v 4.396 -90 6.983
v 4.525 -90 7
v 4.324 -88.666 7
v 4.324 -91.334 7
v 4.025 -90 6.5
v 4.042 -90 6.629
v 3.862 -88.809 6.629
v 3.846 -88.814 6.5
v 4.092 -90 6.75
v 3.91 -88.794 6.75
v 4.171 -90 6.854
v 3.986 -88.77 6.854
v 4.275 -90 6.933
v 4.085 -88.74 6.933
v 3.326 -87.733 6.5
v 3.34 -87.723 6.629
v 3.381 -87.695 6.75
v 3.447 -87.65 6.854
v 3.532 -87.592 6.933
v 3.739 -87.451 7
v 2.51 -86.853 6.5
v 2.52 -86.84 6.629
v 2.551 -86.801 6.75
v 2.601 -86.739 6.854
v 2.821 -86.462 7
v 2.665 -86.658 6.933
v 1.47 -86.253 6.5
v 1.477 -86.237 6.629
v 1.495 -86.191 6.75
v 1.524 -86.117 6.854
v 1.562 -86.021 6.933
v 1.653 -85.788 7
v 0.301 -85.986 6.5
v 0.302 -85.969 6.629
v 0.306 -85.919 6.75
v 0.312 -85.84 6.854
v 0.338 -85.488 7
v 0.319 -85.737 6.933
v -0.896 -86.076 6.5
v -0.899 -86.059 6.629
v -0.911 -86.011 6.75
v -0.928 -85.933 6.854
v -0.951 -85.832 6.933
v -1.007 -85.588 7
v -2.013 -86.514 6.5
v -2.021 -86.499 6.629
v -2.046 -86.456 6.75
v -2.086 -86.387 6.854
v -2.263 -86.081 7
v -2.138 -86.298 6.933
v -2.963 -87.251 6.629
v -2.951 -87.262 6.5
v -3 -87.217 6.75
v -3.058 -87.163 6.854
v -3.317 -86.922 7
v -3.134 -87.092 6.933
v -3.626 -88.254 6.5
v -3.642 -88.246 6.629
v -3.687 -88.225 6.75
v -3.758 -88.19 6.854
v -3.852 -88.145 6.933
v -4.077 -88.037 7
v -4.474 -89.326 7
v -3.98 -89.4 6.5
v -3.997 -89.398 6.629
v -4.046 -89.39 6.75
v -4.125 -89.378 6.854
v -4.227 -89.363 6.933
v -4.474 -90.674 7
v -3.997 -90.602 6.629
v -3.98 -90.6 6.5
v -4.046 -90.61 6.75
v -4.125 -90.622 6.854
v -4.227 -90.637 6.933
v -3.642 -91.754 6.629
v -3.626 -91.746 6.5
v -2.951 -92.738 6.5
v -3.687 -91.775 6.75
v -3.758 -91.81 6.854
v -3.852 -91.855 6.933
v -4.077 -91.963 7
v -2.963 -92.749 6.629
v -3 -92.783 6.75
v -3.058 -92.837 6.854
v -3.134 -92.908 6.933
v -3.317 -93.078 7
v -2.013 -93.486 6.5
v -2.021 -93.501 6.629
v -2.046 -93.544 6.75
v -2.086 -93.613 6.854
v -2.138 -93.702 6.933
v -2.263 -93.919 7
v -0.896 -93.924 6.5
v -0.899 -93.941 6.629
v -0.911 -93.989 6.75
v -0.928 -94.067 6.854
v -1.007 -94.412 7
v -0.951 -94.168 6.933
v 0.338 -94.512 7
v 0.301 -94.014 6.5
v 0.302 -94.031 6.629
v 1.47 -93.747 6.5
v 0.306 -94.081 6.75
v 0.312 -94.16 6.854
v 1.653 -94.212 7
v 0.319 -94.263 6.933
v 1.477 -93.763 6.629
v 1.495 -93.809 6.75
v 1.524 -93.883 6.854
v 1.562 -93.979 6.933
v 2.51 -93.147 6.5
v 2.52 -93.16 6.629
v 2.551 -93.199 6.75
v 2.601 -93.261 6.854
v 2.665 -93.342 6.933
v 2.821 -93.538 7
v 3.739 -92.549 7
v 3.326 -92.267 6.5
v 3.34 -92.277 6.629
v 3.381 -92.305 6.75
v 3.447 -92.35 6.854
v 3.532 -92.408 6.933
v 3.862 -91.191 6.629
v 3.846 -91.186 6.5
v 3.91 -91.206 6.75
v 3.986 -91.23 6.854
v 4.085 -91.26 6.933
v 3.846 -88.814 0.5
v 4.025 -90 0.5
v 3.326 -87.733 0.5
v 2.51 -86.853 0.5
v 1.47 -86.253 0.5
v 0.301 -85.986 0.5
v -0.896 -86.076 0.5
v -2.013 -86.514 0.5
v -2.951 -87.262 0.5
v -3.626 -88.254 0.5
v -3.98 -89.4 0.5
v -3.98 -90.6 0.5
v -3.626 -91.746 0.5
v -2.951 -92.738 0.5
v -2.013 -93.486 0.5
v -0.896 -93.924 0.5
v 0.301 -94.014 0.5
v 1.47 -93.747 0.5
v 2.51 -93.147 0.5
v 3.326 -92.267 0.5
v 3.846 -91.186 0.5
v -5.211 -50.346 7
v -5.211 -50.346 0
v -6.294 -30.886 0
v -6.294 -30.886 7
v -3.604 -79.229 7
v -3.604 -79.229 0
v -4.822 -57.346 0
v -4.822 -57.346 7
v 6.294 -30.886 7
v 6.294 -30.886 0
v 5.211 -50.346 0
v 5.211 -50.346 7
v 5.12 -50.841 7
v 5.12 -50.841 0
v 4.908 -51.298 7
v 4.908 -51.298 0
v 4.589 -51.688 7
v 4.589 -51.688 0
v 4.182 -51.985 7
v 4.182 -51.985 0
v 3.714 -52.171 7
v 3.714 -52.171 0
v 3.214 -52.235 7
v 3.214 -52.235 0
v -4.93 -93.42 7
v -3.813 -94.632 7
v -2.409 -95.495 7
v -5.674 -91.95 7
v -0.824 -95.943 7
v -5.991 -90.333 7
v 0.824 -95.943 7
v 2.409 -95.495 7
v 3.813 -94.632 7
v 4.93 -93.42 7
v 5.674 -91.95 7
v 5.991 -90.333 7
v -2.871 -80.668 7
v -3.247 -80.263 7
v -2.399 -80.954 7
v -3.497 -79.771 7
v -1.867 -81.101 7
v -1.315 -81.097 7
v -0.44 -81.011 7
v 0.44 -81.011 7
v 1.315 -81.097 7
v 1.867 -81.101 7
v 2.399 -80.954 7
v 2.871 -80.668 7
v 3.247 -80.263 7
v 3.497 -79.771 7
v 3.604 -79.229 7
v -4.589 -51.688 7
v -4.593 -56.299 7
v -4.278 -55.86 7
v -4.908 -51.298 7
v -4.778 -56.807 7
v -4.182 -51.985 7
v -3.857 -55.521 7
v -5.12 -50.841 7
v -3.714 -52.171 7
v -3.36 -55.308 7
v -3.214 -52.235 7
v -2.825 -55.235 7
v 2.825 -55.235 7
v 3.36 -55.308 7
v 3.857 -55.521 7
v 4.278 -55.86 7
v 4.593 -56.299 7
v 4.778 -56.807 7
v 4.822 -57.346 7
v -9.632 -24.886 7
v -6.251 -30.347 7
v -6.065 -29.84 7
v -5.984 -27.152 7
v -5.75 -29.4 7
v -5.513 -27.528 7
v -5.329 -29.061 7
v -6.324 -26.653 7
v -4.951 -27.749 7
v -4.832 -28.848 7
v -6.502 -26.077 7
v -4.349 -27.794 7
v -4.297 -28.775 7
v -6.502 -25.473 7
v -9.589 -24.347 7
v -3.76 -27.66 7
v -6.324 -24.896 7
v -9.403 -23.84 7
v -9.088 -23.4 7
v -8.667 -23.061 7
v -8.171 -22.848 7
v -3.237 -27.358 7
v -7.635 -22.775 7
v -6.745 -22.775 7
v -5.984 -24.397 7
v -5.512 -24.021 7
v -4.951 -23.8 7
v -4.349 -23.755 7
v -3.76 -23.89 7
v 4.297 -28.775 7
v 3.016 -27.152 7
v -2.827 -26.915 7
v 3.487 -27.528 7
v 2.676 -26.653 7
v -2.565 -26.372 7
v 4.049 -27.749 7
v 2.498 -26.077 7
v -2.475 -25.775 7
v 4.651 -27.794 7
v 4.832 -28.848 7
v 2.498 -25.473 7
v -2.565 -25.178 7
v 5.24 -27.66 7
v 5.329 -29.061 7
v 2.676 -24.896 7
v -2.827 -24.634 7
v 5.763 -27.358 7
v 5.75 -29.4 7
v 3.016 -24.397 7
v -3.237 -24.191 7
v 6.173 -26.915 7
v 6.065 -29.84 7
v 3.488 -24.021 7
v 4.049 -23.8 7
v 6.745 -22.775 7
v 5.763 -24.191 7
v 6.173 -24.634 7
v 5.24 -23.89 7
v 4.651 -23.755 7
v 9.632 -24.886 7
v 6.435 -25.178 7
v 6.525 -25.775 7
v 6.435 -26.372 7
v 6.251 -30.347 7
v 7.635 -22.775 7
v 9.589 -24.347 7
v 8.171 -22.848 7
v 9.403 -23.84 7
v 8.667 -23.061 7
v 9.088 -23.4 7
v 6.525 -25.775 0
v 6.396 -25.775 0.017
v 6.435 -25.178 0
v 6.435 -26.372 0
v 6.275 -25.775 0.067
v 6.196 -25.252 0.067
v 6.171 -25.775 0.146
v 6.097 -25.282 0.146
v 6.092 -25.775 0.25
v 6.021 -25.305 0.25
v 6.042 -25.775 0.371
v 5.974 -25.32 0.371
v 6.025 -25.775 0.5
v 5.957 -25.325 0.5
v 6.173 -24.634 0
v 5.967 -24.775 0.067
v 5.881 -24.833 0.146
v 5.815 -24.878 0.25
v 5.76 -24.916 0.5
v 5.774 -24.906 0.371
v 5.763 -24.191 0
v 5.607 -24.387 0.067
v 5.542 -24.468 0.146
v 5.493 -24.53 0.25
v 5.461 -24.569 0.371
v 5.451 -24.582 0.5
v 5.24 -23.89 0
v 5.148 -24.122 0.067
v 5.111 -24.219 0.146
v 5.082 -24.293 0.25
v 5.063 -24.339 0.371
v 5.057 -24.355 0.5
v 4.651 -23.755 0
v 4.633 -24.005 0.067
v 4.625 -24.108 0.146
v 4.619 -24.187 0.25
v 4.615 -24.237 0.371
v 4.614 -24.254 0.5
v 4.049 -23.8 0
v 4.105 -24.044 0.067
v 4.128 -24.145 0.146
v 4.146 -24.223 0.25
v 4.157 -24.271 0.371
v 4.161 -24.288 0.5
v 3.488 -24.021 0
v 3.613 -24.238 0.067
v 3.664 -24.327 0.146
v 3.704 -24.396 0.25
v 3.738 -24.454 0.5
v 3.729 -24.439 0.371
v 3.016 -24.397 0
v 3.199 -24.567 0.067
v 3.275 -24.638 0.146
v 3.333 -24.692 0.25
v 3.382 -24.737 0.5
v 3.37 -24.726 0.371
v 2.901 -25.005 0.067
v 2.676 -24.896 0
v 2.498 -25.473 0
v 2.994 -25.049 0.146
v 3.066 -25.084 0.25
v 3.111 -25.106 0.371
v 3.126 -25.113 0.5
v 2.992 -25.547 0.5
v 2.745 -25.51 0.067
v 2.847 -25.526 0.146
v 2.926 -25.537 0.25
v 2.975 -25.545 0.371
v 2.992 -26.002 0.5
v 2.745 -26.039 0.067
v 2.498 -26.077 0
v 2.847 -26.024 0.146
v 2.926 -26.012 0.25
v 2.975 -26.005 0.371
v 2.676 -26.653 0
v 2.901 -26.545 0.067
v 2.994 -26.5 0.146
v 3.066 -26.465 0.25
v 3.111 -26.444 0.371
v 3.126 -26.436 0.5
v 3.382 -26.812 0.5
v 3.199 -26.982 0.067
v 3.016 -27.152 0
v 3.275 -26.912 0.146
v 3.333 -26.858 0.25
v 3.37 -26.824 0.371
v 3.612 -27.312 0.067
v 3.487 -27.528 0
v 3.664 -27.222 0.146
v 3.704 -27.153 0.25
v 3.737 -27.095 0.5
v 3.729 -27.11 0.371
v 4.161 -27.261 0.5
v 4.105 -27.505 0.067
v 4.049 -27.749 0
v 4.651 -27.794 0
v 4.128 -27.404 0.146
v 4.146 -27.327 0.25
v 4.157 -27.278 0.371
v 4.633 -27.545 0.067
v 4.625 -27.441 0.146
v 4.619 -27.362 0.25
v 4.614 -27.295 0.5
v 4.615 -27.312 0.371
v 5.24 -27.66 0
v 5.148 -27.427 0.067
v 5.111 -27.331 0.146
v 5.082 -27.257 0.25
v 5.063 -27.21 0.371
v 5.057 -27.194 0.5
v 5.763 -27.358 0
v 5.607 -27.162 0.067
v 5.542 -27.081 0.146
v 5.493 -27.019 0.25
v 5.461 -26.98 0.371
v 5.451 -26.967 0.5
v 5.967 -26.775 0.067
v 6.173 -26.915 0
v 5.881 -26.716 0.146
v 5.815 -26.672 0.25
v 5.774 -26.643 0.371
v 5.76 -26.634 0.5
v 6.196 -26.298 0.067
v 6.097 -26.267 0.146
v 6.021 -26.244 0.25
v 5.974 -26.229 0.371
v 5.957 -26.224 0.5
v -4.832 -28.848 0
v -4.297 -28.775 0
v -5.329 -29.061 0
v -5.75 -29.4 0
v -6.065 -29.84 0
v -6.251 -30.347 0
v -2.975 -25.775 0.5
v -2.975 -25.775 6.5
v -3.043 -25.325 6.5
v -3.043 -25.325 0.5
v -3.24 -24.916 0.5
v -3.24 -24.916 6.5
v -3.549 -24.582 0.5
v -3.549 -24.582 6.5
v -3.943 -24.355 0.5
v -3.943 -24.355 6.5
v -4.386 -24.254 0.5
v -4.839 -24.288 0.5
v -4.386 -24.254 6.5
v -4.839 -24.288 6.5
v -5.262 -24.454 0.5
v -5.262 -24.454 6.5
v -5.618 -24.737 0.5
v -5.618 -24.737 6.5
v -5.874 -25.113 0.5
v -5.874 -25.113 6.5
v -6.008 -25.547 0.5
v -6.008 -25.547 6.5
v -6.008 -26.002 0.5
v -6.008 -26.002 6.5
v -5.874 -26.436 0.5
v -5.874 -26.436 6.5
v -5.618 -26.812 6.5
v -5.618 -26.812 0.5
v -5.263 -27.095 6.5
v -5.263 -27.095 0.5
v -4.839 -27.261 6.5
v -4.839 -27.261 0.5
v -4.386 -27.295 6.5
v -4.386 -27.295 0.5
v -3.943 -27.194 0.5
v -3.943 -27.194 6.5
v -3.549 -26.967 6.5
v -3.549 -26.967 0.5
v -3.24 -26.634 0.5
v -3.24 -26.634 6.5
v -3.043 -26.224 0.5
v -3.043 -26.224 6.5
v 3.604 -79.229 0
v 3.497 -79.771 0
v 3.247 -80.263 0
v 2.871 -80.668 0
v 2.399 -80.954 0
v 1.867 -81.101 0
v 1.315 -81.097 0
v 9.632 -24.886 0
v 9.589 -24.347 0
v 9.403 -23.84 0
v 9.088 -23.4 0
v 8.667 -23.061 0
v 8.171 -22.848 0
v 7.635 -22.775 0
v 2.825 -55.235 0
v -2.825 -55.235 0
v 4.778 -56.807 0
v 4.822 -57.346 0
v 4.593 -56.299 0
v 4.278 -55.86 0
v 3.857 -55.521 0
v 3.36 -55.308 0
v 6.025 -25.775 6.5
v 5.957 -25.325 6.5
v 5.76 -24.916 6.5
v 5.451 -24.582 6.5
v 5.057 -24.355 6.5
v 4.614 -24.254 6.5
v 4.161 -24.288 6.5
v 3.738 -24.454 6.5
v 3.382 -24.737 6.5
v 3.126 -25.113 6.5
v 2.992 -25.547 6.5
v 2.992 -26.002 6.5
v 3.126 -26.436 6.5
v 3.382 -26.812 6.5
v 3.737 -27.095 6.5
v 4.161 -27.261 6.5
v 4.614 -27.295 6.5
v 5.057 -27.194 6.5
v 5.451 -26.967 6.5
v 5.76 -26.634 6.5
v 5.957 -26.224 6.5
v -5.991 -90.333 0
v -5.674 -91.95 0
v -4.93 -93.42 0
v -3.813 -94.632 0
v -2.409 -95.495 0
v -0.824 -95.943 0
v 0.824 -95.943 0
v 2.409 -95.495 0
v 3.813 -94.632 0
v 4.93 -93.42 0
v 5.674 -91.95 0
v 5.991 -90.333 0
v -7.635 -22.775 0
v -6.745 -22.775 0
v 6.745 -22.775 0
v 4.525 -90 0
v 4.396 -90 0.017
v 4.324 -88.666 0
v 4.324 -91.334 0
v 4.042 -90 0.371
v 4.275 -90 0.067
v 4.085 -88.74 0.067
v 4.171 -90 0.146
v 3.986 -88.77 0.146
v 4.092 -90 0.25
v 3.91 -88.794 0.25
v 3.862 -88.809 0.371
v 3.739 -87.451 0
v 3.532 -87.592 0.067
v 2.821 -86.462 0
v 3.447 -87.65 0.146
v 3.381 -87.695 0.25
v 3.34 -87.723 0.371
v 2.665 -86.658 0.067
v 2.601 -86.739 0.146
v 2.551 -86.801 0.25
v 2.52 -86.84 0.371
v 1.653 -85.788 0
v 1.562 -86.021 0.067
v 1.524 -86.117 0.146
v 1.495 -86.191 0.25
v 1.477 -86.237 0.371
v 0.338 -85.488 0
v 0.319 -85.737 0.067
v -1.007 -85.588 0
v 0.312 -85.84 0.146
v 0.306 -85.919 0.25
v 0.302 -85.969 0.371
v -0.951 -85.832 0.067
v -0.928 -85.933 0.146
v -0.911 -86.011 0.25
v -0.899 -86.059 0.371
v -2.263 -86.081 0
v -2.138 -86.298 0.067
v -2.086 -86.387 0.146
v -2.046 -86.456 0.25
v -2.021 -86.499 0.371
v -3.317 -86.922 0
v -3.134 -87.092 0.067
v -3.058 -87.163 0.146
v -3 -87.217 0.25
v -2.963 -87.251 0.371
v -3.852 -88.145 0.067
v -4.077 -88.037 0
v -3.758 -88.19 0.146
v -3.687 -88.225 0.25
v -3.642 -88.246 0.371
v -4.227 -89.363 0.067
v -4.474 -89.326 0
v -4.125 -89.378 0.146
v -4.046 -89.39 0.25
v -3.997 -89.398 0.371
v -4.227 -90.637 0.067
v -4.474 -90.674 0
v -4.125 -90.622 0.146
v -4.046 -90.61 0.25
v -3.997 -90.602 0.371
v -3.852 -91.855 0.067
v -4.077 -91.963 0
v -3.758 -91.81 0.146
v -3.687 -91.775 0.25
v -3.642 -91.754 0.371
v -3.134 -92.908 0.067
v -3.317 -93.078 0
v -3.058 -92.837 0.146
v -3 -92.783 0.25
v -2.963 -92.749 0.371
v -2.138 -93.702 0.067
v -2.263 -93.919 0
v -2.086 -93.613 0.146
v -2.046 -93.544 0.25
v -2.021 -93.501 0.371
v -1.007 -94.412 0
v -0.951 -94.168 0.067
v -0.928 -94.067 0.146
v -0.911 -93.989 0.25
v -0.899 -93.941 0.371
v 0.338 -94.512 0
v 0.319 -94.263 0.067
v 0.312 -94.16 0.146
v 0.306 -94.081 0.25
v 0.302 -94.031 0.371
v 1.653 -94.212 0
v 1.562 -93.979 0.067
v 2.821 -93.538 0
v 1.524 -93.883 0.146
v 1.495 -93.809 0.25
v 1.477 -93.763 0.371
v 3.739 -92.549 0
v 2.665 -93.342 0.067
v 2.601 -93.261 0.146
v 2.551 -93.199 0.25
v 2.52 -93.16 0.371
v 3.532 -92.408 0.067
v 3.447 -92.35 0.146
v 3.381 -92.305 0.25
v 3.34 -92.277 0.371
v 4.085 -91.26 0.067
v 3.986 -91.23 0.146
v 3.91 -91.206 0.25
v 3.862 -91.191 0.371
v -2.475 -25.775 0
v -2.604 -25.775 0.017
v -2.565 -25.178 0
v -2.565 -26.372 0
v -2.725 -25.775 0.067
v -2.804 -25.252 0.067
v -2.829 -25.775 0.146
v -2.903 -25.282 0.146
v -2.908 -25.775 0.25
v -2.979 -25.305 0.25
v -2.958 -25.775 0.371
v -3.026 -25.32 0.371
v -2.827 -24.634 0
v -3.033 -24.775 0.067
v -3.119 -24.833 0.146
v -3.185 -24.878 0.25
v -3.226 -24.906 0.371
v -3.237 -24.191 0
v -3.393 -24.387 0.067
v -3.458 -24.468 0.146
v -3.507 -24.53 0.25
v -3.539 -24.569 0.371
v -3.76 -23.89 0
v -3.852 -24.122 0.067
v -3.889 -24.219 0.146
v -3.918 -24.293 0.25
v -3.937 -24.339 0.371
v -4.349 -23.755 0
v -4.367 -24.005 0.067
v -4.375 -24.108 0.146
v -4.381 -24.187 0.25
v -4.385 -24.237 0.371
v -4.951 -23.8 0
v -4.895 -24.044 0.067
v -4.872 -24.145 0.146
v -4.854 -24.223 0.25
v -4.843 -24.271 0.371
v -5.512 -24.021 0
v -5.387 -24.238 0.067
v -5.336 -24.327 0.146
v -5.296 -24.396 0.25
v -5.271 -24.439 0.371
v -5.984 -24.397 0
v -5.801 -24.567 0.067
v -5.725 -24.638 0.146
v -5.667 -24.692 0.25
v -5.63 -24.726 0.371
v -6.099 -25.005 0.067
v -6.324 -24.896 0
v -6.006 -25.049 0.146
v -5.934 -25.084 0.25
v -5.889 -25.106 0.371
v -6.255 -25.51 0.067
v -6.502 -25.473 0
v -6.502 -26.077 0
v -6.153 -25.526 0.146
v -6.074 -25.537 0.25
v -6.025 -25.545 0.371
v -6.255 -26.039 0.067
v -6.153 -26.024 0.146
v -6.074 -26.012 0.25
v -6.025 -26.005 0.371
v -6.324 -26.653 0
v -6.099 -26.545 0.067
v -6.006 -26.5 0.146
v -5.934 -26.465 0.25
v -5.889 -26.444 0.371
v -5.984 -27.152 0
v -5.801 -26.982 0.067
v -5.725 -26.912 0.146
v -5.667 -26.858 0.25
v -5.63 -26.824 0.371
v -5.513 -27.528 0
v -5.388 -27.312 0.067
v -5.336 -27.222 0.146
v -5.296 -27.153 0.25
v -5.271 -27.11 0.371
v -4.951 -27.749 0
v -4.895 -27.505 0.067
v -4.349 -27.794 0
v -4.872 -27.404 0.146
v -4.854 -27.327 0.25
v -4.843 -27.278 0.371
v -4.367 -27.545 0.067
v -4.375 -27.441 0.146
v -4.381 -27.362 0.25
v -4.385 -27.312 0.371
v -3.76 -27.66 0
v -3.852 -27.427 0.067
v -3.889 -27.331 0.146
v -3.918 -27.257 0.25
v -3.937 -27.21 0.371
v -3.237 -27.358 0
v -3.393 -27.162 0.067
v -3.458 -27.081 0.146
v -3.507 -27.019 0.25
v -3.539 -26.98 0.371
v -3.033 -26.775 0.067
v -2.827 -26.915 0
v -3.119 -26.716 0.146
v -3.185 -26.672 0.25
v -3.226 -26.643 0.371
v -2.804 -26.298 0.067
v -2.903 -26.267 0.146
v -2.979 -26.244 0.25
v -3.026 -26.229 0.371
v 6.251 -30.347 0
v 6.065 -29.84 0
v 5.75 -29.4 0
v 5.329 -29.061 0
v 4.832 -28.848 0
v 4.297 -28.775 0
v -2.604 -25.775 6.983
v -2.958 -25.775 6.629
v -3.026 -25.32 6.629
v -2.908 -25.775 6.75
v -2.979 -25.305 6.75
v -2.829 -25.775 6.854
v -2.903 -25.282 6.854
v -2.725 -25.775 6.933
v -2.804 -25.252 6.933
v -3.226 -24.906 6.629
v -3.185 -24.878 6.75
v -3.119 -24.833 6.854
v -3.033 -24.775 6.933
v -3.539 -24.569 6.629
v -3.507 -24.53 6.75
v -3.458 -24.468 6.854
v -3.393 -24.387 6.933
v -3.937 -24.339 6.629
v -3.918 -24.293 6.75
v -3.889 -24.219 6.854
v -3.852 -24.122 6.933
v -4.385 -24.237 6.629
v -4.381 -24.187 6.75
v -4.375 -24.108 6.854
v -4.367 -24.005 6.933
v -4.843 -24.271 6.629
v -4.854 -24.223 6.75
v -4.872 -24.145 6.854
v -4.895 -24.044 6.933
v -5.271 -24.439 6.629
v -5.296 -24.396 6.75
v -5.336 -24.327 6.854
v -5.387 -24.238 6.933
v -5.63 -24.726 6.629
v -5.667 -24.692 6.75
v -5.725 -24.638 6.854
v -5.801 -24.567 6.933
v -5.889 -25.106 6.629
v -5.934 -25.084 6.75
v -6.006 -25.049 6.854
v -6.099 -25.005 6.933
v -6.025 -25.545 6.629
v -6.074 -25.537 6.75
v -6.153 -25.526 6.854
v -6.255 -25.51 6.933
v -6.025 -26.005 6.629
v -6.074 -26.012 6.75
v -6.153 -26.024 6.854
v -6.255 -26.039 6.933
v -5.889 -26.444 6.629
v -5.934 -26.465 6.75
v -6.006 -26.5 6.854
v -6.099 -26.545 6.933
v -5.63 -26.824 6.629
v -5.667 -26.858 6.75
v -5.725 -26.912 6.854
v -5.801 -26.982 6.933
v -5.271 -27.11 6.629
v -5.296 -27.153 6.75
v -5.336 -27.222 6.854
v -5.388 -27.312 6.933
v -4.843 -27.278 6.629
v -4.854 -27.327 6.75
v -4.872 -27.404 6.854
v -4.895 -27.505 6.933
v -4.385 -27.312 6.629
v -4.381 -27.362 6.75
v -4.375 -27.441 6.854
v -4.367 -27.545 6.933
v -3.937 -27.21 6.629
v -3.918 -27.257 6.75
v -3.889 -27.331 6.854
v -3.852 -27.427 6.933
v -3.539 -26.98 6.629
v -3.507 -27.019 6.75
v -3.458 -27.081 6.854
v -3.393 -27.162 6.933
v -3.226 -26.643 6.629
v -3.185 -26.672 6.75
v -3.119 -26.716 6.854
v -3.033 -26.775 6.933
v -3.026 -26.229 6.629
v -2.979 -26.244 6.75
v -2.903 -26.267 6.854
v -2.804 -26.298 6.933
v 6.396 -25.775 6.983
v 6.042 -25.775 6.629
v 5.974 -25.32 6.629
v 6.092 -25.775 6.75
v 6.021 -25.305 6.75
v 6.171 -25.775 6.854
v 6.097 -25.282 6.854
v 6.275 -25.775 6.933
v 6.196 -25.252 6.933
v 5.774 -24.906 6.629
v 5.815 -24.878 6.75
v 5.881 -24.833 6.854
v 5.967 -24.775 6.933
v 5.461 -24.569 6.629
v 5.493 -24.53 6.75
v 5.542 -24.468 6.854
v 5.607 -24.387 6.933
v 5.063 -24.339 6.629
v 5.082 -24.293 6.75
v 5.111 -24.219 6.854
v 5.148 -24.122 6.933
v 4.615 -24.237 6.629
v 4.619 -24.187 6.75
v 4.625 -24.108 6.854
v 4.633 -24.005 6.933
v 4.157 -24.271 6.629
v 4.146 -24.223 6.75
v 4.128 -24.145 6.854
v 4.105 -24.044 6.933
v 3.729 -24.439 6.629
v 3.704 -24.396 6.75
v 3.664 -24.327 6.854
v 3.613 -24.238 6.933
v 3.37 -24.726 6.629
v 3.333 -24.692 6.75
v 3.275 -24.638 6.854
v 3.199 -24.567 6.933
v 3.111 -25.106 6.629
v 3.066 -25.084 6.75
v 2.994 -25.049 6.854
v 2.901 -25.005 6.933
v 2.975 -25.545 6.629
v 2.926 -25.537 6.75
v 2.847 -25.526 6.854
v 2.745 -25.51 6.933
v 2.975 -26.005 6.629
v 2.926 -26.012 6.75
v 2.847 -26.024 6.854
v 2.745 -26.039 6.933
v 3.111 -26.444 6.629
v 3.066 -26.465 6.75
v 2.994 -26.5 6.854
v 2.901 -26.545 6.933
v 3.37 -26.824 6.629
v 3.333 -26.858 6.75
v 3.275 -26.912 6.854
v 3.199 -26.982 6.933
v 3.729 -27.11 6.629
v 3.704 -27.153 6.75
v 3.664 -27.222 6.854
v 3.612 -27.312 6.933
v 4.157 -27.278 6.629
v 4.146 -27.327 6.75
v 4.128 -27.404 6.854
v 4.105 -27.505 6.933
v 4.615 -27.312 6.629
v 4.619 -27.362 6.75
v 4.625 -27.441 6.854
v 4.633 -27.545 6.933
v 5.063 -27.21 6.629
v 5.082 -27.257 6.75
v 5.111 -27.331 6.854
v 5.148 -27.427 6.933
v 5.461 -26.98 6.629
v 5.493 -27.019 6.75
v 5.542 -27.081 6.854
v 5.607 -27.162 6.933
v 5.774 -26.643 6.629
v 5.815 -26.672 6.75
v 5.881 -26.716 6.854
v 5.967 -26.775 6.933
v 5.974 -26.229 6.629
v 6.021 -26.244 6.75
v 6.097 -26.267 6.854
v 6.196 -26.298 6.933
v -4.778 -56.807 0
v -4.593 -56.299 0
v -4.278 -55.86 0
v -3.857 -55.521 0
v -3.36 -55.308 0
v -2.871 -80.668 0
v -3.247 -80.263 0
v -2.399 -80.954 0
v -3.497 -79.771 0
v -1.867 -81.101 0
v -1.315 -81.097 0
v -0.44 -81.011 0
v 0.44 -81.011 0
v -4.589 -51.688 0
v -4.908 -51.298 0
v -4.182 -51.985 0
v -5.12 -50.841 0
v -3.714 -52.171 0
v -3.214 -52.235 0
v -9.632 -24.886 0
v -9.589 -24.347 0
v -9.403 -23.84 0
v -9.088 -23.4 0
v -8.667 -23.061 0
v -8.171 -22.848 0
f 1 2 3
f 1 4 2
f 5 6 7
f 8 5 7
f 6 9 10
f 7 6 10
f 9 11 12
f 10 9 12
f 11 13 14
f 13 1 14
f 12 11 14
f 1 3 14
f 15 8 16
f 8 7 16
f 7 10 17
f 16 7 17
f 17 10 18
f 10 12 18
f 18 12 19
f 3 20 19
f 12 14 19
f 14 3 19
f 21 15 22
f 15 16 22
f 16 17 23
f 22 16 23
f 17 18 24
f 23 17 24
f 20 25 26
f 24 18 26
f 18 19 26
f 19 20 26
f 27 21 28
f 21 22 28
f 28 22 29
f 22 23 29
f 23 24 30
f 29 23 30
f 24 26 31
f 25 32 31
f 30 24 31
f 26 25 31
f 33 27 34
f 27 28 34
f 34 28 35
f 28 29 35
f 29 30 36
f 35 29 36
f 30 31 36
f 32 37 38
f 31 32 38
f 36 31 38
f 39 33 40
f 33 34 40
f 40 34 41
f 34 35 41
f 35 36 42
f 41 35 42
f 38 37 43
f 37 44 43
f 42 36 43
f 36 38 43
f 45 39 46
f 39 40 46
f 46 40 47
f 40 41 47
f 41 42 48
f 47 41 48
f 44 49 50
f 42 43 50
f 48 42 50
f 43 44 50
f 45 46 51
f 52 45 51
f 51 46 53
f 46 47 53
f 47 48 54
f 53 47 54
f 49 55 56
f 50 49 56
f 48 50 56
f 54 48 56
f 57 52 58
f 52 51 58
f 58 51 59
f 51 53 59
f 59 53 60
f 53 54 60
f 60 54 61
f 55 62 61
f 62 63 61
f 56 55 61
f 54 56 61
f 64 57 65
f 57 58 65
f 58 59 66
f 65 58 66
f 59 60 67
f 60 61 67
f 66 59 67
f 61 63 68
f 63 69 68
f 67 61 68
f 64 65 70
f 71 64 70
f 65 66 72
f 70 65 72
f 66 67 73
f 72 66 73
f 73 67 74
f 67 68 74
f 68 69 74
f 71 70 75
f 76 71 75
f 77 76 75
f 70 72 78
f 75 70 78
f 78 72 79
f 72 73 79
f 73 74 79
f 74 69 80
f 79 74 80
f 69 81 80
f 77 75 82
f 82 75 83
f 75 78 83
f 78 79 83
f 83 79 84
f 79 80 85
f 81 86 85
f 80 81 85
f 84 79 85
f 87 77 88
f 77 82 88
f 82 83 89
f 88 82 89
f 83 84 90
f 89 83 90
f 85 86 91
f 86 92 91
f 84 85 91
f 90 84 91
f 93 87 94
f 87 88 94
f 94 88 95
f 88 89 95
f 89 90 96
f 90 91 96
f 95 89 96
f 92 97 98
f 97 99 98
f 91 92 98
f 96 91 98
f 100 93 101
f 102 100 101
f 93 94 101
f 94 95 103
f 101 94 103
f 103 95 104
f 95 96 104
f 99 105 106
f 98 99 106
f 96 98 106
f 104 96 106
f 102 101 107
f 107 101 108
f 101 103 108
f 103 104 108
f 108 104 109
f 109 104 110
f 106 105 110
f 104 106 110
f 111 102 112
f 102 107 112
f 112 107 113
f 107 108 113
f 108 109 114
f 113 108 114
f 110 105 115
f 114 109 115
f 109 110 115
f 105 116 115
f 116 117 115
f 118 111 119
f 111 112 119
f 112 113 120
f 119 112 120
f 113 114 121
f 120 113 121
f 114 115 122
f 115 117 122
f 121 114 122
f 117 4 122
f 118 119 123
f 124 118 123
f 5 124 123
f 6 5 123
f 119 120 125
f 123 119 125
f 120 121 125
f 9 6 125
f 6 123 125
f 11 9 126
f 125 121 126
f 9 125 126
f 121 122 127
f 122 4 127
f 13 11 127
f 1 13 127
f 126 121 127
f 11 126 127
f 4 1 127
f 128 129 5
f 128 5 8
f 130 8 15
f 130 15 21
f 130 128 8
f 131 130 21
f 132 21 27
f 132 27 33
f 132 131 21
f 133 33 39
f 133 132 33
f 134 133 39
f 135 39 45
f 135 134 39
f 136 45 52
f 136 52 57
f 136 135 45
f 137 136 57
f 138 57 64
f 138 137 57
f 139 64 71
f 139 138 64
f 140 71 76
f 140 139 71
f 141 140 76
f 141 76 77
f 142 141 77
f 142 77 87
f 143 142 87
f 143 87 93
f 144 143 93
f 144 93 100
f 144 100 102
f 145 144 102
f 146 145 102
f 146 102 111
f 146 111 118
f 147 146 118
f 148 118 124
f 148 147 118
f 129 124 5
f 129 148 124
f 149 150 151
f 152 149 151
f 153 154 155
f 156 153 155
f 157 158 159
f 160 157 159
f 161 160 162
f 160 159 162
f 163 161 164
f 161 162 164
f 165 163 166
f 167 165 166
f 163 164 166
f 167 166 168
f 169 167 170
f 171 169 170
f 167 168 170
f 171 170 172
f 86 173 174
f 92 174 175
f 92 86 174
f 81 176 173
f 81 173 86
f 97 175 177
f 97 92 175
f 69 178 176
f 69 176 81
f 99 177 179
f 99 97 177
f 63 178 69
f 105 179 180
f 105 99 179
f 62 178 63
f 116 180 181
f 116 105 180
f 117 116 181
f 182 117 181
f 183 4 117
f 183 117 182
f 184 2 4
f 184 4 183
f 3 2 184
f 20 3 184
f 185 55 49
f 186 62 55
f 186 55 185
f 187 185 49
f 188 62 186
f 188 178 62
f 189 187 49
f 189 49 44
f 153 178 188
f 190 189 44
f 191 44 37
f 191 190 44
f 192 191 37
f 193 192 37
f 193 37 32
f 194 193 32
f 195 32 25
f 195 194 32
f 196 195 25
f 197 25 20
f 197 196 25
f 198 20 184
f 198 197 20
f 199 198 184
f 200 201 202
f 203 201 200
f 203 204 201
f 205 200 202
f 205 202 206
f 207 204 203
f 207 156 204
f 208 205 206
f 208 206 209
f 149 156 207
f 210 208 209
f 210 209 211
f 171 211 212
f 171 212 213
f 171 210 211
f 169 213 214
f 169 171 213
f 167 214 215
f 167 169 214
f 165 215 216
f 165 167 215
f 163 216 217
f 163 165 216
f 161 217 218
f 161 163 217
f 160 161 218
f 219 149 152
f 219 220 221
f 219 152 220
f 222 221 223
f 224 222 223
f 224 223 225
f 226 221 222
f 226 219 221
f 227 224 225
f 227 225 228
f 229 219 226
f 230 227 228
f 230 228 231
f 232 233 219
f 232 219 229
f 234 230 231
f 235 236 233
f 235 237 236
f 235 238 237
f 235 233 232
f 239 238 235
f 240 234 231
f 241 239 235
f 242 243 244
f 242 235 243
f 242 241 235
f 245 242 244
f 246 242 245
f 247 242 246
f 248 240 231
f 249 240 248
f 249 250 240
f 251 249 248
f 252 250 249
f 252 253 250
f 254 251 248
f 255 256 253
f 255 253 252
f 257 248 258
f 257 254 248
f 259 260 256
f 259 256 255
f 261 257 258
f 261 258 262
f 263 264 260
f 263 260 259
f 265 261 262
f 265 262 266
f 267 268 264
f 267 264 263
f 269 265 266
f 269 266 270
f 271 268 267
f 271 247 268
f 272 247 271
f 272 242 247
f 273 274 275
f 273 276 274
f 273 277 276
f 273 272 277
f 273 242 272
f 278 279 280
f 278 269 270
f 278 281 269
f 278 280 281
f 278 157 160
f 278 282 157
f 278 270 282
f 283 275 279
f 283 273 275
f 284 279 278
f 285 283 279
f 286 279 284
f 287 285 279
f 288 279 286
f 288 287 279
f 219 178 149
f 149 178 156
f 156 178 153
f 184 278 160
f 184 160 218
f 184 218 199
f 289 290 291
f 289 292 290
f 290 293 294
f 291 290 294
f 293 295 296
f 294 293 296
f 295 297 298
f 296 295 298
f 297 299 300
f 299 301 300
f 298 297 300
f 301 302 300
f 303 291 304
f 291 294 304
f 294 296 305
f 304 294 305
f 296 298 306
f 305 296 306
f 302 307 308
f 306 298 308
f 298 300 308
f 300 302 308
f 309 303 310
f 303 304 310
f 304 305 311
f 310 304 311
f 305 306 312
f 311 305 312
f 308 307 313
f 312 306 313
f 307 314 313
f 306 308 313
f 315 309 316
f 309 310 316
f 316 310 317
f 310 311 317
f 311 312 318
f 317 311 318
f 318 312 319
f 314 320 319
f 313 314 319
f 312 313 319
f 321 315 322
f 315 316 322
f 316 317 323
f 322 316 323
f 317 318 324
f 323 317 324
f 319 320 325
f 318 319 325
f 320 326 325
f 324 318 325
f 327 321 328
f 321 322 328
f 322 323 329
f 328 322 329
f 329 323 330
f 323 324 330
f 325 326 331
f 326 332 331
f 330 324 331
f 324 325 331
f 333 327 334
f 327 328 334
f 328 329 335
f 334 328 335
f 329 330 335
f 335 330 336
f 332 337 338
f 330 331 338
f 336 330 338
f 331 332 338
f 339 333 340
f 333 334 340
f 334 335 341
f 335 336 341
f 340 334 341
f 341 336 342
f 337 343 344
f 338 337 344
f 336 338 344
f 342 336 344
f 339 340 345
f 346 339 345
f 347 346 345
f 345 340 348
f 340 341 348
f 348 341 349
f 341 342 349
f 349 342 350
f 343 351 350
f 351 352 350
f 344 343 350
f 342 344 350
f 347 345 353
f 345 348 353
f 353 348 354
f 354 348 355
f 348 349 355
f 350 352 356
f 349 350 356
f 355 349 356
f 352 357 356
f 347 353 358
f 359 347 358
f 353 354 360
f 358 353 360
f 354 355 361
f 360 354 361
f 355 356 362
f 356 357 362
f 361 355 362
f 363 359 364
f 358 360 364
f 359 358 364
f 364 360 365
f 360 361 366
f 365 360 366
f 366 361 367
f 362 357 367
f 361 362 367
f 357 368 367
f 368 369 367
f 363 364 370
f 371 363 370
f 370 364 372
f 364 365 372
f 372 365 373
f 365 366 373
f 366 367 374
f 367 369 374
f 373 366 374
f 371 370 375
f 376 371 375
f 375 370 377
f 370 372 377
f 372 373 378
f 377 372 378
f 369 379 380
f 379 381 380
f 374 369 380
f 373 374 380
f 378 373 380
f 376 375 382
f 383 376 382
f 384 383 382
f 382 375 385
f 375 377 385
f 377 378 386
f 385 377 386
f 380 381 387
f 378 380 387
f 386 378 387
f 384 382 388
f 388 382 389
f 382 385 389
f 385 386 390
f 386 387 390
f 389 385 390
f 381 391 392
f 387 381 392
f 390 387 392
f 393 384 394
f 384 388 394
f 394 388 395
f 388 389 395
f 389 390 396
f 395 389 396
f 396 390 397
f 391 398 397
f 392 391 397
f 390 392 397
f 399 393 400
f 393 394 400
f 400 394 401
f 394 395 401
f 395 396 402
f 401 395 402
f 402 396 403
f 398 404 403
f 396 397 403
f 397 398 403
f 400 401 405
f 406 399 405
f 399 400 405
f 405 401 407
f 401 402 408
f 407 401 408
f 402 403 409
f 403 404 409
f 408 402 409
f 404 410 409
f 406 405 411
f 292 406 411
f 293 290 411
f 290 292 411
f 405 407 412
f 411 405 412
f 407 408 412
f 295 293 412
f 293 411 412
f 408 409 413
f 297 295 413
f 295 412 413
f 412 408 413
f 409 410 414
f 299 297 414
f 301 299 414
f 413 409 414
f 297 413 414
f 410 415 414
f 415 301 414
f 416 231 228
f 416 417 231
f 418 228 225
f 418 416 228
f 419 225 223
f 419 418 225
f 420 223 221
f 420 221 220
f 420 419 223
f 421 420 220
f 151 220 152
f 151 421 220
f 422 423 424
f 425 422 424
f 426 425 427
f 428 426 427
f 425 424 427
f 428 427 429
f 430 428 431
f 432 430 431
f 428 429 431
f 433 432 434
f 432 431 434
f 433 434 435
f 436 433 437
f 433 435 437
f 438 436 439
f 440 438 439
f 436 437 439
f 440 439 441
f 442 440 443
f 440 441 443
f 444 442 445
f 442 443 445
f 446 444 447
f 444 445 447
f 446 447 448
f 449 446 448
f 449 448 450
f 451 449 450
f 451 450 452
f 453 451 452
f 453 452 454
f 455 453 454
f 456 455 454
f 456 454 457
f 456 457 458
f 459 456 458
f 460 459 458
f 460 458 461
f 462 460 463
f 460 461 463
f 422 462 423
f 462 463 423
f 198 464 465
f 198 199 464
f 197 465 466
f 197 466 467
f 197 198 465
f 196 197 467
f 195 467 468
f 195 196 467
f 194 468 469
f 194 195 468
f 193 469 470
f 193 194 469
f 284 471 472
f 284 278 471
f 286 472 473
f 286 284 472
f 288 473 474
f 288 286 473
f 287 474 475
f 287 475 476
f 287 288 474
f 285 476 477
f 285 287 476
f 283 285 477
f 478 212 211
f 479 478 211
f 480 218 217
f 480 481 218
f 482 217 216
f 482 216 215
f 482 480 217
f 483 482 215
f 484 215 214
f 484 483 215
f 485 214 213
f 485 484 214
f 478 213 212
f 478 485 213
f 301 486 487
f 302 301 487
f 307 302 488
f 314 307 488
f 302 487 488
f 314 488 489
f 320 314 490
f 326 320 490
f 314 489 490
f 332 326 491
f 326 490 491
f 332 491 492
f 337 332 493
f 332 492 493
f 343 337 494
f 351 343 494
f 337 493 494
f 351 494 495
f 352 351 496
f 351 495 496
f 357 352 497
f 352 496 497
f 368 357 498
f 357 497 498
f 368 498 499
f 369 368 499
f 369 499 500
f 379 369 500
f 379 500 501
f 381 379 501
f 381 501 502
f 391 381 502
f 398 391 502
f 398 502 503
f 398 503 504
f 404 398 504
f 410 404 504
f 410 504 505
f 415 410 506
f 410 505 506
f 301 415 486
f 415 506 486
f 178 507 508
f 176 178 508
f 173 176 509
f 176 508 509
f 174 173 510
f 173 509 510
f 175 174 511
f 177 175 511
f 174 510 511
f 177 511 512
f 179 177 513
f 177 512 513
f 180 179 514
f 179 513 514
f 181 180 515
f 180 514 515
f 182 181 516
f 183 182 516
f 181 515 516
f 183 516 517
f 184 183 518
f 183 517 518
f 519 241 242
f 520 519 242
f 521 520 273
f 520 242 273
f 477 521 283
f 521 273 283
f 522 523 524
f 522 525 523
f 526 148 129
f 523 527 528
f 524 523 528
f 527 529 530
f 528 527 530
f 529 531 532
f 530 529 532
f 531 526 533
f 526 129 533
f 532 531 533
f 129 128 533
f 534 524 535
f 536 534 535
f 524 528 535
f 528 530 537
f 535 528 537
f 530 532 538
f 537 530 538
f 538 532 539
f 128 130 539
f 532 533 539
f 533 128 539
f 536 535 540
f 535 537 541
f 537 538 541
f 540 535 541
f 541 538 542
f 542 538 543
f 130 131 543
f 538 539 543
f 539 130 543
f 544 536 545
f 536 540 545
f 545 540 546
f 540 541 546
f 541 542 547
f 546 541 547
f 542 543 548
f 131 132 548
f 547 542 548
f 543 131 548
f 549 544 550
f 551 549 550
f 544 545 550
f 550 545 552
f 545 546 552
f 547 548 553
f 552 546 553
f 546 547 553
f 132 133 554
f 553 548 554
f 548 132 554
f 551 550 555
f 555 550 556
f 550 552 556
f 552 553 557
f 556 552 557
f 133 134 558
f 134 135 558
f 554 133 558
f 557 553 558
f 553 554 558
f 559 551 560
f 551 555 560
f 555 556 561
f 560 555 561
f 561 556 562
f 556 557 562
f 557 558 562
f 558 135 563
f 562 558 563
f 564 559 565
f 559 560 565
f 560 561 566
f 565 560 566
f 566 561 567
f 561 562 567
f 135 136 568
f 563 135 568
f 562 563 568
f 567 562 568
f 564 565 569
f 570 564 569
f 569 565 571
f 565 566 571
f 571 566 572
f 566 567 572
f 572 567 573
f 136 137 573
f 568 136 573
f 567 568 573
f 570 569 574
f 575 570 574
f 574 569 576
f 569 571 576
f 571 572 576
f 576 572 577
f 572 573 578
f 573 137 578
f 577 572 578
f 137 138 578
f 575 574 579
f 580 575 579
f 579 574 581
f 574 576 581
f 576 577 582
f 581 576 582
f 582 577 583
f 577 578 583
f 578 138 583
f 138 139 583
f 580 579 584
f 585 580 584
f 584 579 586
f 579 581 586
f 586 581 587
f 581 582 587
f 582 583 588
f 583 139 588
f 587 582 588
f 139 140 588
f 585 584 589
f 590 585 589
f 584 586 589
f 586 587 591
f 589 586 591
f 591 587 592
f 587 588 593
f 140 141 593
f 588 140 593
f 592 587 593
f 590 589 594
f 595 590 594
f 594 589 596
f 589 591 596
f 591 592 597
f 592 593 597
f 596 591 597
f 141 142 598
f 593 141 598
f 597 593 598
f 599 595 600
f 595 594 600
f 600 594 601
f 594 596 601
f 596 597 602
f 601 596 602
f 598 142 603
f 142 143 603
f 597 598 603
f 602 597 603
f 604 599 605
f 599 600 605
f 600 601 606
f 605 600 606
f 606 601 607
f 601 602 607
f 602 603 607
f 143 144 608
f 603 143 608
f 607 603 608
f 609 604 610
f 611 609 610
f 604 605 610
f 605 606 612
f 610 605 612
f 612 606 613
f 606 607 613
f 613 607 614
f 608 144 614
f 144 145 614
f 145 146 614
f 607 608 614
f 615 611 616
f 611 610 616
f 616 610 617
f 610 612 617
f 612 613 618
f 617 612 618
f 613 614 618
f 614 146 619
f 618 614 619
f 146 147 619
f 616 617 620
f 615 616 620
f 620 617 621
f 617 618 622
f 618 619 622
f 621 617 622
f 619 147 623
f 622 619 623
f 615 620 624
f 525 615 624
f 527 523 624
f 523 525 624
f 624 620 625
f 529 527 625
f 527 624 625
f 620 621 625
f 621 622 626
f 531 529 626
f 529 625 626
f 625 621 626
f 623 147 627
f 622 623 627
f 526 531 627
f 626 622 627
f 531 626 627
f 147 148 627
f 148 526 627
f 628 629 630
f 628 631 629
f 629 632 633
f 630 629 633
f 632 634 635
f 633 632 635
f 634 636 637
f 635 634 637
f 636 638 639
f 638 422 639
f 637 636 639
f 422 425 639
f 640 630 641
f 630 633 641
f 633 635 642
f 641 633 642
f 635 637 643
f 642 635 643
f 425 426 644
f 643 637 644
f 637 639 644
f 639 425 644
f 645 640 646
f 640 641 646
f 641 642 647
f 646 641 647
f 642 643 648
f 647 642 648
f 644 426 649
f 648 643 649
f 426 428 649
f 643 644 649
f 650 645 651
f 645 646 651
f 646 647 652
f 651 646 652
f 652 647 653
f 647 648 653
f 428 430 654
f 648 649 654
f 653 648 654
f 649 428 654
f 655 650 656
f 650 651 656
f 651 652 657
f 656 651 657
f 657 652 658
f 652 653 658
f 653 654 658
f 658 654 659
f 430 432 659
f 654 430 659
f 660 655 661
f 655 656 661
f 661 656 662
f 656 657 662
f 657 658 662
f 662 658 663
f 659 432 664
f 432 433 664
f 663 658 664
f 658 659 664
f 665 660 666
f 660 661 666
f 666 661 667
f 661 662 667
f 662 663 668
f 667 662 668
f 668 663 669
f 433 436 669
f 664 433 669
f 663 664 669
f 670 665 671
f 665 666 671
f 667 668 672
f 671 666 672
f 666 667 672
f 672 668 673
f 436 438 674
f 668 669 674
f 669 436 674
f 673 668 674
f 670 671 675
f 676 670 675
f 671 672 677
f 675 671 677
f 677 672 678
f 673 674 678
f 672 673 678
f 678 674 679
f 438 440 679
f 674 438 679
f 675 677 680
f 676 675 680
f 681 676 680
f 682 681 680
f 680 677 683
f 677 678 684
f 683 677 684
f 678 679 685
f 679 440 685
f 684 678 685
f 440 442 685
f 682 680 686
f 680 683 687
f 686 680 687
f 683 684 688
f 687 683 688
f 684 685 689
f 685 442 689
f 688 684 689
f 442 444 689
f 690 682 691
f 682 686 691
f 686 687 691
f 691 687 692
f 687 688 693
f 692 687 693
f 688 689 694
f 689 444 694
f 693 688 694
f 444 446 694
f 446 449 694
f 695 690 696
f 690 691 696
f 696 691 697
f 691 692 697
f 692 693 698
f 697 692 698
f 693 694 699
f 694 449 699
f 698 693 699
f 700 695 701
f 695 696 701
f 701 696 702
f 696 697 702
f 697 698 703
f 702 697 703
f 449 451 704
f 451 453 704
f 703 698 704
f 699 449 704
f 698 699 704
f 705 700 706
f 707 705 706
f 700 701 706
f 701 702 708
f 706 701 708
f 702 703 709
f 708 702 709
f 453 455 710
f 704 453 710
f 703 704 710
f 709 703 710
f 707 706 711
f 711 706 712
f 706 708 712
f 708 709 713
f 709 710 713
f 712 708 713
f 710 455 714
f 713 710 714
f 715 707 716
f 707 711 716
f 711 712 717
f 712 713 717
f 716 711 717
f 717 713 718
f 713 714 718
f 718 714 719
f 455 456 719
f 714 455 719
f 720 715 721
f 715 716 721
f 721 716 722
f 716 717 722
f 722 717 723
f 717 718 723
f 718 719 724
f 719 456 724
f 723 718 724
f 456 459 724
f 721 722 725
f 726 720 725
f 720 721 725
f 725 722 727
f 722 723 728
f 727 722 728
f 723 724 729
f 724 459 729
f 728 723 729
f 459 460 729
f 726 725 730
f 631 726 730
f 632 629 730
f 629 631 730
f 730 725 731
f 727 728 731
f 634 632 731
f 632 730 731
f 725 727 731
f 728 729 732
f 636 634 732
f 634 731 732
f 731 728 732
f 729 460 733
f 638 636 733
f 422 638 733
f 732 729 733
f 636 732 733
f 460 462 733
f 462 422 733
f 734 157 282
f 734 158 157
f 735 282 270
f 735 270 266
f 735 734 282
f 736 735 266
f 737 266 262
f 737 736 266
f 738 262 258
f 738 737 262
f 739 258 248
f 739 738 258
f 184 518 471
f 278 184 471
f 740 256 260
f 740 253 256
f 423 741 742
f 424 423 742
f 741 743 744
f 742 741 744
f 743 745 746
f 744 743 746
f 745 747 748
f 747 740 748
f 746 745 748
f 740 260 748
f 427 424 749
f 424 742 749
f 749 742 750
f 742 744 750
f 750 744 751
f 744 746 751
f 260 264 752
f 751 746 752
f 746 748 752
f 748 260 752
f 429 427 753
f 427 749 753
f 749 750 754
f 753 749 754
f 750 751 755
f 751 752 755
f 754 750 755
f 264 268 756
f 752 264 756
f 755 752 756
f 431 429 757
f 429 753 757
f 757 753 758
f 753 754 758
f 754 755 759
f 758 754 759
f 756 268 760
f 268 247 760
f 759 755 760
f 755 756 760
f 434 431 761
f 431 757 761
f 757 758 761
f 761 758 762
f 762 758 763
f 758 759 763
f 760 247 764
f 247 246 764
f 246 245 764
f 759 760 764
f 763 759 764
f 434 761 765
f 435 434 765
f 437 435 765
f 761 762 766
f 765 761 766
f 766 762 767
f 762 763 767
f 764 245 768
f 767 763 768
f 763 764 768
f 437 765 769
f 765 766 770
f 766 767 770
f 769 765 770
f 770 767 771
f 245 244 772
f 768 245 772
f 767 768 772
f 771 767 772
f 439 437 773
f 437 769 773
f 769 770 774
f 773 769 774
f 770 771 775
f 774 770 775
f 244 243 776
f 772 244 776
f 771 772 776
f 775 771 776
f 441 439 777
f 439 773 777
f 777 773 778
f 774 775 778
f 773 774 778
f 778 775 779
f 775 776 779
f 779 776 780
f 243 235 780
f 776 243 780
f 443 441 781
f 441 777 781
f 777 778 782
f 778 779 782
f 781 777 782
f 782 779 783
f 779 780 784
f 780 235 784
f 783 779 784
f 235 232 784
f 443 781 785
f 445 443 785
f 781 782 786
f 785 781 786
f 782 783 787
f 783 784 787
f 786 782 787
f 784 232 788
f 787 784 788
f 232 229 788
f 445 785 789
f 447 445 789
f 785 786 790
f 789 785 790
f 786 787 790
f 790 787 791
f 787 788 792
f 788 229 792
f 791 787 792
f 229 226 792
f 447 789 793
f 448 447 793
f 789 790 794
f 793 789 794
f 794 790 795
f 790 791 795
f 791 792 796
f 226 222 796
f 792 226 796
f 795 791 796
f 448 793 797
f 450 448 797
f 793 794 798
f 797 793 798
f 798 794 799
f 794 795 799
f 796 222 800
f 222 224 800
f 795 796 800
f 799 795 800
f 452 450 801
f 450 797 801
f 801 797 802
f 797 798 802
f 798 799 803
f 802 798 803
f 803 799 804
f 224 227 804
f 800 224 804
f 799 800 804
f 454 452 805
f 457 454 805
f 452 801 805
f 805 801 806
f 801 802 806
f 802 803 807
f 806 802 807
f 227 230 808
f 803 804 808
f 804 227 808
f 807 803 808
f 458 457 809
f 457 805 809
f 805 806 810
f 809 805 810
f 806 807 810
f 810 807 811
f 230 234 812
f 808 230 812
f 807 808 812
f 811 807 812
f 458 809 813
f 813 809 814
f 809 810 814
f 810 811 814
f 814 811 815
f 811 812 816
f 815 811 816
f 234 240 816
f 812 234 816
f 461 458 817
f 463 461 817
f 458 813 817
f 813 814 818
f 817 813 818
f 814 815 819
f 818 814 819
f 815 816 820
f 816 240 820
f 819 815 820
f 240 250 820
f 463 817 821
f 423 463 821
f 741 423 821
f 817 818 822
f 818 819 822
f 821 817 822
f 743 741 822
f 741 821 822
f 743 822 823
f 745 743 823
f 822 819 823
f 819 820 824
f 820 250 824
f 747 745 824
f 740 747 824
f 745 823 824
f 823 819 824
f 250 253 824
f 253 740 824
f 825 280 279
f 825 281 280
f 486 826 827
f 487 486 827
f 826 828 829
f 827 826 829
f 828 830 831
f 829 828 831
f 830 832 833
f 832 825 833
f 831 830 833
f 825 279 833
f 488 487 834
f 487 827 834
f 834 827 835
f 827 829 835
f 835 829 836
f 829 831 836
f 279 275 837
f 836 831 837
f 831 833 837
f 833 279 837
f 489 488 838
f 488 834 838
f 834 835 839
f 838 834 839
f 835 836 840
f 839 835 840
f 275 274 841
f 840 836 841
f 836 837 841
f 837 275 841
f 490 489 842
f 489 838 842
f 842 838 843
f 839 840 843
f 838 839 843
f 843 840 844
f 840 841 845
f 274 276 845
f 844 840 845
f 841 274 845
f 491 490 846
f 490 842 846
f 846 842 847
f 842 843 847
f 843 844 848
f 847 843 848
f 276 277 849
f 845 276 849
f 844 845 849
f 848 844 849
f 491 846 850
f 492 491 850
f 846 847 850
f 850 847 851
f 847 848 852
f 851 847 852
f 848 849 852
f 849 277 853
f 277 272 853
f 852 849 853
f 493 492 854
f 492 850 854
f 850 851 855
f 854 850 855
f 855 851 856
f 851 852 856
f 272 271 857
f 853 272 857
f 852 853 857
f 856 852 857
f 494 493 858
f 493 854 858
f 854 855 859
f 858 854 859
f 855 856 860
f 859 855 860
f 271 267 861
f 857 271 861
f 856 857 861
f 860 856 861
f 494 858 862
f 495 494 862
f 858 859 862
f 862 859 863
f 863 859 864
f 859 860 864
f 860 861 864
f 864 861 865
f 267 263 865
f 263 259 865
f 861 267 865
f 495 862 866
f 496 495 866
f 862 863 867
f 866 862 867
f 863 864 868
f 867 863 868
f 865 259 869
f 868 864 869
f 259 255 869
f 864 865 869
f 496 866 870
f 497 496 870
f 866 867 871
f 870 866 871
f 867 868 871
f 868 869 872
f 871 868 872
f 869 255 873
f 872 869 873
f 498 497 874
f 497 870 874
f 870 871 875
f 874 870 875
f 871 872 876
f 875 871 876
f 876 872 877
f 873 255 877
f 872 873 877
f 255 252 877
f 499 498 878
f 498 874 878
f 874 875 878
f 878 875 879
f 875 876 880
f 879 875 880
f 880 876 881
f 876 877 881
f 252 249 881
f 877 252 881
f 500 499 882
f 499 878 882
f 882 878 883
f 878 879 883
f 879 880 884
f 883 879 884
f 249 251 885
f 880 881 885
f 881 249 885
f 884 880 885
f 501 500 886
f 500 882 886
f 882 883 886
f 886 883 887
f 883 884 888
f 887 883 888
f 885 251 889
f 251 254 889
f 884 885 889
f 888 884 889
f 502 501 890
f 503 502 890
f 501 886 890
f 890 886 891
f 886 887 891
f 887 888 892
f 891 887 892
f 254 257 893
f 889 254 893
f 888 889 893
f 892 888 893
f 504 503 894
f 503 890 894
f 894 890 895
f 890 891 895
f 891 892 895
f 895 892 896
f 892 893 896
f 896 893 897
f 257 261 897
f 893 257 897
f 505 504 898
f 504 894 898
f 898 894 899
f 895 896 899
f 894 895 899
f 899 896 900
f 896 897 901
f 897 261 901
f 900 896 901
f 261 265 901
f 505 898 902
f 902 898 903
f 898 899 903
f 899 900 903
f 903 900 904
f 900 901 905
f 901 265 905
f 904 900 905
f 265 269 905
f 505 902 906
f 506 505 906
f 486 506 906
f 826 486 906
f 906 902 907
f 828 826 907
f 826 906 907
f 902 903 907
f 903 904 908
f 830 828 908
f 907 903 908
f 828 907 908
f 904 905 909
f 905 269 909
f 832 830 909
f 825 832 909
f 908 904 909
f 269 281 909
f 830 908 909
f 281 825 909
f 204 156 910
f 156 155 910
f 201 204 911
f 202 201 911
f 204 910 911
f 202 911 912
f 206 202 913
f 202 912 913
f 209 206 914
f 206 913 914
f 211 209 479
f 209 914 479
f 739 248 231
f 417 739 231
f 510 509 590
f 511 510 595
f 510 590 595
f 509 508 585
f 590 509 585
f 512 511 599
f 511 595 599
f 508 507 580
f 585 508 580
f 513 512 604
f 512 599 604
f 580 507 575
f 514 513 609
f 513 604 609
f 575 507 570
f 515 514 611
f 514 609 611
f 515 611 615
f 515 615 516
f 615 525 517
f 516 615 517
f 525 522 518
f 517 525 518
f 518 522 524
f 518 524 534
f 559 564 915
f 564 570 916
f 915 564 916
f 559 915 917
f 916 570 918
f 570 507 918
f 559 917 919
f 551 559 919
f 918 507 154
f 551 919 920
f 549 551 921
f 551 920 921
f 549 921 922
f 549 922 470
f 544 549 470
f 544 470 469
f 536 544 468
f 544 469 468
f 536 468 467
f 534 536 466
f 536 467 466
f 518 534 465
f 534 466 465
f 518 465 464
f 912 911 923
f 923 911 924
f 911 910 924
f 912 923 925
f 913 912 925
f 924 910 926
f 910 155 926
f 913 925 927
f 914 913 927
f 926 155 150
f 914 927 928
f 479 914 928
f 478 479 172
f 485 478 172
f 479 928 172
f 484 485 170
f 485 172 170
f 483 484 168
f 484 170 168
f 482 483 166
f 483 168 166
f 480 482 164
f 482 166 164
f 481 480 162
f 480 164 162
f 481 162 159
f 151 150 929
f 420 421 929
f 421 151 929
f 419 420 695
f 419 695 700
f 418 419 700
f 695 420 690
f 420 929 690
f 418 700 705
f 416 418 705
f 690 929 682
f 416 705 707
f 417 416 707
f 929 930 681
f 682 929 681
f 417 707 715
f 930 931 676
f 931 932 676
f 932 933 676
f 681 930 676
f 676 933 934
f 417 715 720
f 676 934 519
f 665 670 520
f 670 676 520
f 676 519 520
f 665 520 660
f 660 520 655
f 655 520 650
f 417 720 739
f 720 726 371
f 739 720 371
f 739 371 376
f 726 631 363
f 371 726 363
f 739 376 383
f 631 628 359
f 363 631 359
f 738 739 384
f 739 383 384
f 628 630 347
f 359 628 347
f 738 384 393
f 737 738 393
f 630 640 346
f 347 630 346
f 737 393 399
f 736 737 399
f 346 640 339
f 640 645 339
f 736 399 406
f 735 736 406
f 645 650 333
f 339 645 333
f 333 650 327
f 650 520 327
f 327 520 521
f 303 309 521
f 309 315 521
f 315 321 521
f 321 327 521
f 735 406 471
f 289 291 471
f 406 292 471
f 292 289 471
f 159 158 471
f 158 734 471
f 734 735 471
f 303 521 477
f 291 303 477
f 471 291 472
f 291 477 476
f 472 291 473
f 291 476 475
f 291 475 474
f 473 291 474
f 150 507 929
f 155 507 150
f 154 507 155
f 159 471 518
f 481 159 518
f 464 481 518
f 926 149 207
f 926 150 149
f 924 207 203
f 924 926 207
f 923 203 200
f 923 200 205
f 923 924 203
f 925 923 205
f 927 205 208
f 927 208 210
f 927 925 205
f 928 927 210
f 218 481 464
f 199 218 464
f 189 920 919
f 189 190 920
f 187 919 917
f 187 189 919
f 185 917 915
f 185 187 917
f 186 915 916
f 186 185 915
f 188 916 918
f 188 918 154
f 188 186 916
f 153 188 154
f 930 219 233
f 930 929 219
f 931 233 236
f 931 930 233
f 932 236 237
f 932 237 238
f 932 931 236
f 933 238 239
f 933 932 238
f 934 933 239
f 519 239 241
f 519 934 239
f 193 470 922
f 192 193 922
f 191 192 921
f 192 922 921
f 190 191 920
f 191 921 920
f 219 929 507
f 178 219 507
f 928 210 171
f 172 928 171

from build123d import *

# Parameters (mm, degrees)
SKETCH_1_R          = 11
SKETCH_1_R_2        = 3.5
SKETCH_1_R_3        = 1.01
SKETCH_1_R_4        = 6
SKETCH_1_R_5        = 4.025
EXTRUDE_1_DEPTH     = 7
SKETCH_2_R          = 1.525
EXTRUDE_2_DEPTH     = 7
SKETCH_3_W          = 24.553172336
SKETCH_3_H          = 36.576889883
CUT_EXTRUDE_1_DEPTH = 29
EXTRUDE_3_DEPTH     = 7
FILLET_1_R          = 2
FILLET_2_R          = 0.5


with BuildPart() as part:
    # 草图1 → 凸台-拉伸1 (new body)
    # profile 1 of 3: a face of its own
    with BuildSketch(Plane.XY):
        with BuildLine():
            ThreePointArc((10.983011573, -0.611111111), (0, -11), (-10.983011573, -0.611111111))
            Line((-10.983011573, -0.611111111), (-5.990733585, -90.333333333))
            ThreePointArc((-5.990733585, -90.333333333), (-0.166731054, -84.002317051), (6, -90))
            ThreePointArc((6, -90), (5.997682949, -90.166731054), (5.990733585, -90.333333333))
            Line((5.990733585, -90.333333333), (10.983011573, -0.611111111))
        make_face()
        with BuildLine():
            Line((-3.466771313, -81.694489982), (-7.418369738, -10.675569794))
            ThreePointArc((-7.418369738, -10.675569794), (0, -13), (7.418369738, -10.675569794))
            Line((7.418369738, -10.675569794), (3.466771313, -81.694489982))
            ThreePointArc((3.466771313, -81.694489982), (0, -81), (-3.466771313, -81.694489982))
        make_face(mode=Mode.SUBTRACT)
    # profile 2 of 3: a face of its own
    with BuildSketch(Plane.XY):
        Circle(SKETCH_1_R)
        Circle(SKETCH_1_R_2, mode=Mode.SUBTRACT)
        with Locations((-2.75, 4.763139721)):
            Circle(SKETCH_1_R_3, mode=Mode.SUBTRACT)
        with Locations((-2.75, -4.763139721)):
            Circle(SKETCH_1_R_3, mode=Mode.SUBTRACT)
        with Locations((5.5, 0)):
            Circle(SKETCH_1_R_3, mode=Mode.SUBTRACT)
    # profile 3 of 3: a face of its own
    with BuildSketch(Plane.XY):
        with Locations((0, -90)):
            Circle(SKETCH_1_R_4)
        with Locations((0, -90)):
            Circle(SKETCH_1_R_5, mode=Mode.SUBTRACT)
    extrude(amount=EXTRUDE_1_DEPTH)

    # 草图2 → 凸台-拉伸2 (add)
    with BuildSketch(Plane.XY.offset(7)):
        Polygon((-6.745155967, -22.774702841), (6.745155967, -22.774702841), (6.411307036, -28.774702841), (-6.411307036, -28.774702841), align=None)
        with Locations((-4.5, -25.774702841)):
            Circle(SKETCH_2_R, mode=Mode.SUBTRACT)
        with Locations((4.5, -25.774702841)):
            Circle(SKETCH_2_R, mode=Mode.SUBTRACT)
    extrude(amount=-EXTRUDE_2_DEPTH)

    # 草图3 → 切除-拉伸1 (cut)
    with BuildSketch(Plane.XY.offset(7)):
        with Locations((0.16395552, -4.486257899)):
            Rectangle(SKETCH_3_W, SKETCH_3_H)
    extrude(amount=-CUT_EXTRUDE_1_DEPTH, mode=Mode.SUBTRACT)

    # 草图4 → 凸台-拉伸3 (add)
    with BuildSketch(Plane.XY.offset(7)):
        Polygon((-5.10596364, -52.234596412), (5.10596364, -52.234596412), (4.939039175, -55.234596412), (-4.939039175, -55.234596412), align=None)
    extrude(amount=-EXTRUDE_3_DEPTH)

    # 圆角1
    fillet_1_edges = [part.edges().sort_by_distance(p)[0] for p in [
        (-4.939039175, -55.234596412, 3.5),
        (-5.10596364, -52.234596412, 3.5),
        (5.10596364, -52.234596412, 3.5),
        (4.939039175, -55.234596412, 3.5),
        (-3.466771313, -81.694489982, 3.5),
        (3.466771313, -81.694489982, 3.5),
        (6.411307036, -28.774702841, 3.5),
        (-6.411307036, -28.774702841, 3.5),
        (-9.749796341, -22.774702841, 3.5),
        (9.749796341, -22.774702841, 3.5),
    ]]
    fillet(fillet_1_edges, radius=FILLET_1_R)

    # 圆角2
    fillet_2_edges = [part.edges().sort_by_distance(p)[0] for p in [
        (-4.025, -90, 0),
        (-6.025, -25.774702841, 0),
        (-6.025, -25.774702841, 7),
        (2.975, -25.774702841, 0),
        (2.975, -25.774702841, 7),
        (-4.025, -90, 7),
    ]]
    fillet(fillet_2_edges, radius=FILLET_2_R)


solid = part.part
